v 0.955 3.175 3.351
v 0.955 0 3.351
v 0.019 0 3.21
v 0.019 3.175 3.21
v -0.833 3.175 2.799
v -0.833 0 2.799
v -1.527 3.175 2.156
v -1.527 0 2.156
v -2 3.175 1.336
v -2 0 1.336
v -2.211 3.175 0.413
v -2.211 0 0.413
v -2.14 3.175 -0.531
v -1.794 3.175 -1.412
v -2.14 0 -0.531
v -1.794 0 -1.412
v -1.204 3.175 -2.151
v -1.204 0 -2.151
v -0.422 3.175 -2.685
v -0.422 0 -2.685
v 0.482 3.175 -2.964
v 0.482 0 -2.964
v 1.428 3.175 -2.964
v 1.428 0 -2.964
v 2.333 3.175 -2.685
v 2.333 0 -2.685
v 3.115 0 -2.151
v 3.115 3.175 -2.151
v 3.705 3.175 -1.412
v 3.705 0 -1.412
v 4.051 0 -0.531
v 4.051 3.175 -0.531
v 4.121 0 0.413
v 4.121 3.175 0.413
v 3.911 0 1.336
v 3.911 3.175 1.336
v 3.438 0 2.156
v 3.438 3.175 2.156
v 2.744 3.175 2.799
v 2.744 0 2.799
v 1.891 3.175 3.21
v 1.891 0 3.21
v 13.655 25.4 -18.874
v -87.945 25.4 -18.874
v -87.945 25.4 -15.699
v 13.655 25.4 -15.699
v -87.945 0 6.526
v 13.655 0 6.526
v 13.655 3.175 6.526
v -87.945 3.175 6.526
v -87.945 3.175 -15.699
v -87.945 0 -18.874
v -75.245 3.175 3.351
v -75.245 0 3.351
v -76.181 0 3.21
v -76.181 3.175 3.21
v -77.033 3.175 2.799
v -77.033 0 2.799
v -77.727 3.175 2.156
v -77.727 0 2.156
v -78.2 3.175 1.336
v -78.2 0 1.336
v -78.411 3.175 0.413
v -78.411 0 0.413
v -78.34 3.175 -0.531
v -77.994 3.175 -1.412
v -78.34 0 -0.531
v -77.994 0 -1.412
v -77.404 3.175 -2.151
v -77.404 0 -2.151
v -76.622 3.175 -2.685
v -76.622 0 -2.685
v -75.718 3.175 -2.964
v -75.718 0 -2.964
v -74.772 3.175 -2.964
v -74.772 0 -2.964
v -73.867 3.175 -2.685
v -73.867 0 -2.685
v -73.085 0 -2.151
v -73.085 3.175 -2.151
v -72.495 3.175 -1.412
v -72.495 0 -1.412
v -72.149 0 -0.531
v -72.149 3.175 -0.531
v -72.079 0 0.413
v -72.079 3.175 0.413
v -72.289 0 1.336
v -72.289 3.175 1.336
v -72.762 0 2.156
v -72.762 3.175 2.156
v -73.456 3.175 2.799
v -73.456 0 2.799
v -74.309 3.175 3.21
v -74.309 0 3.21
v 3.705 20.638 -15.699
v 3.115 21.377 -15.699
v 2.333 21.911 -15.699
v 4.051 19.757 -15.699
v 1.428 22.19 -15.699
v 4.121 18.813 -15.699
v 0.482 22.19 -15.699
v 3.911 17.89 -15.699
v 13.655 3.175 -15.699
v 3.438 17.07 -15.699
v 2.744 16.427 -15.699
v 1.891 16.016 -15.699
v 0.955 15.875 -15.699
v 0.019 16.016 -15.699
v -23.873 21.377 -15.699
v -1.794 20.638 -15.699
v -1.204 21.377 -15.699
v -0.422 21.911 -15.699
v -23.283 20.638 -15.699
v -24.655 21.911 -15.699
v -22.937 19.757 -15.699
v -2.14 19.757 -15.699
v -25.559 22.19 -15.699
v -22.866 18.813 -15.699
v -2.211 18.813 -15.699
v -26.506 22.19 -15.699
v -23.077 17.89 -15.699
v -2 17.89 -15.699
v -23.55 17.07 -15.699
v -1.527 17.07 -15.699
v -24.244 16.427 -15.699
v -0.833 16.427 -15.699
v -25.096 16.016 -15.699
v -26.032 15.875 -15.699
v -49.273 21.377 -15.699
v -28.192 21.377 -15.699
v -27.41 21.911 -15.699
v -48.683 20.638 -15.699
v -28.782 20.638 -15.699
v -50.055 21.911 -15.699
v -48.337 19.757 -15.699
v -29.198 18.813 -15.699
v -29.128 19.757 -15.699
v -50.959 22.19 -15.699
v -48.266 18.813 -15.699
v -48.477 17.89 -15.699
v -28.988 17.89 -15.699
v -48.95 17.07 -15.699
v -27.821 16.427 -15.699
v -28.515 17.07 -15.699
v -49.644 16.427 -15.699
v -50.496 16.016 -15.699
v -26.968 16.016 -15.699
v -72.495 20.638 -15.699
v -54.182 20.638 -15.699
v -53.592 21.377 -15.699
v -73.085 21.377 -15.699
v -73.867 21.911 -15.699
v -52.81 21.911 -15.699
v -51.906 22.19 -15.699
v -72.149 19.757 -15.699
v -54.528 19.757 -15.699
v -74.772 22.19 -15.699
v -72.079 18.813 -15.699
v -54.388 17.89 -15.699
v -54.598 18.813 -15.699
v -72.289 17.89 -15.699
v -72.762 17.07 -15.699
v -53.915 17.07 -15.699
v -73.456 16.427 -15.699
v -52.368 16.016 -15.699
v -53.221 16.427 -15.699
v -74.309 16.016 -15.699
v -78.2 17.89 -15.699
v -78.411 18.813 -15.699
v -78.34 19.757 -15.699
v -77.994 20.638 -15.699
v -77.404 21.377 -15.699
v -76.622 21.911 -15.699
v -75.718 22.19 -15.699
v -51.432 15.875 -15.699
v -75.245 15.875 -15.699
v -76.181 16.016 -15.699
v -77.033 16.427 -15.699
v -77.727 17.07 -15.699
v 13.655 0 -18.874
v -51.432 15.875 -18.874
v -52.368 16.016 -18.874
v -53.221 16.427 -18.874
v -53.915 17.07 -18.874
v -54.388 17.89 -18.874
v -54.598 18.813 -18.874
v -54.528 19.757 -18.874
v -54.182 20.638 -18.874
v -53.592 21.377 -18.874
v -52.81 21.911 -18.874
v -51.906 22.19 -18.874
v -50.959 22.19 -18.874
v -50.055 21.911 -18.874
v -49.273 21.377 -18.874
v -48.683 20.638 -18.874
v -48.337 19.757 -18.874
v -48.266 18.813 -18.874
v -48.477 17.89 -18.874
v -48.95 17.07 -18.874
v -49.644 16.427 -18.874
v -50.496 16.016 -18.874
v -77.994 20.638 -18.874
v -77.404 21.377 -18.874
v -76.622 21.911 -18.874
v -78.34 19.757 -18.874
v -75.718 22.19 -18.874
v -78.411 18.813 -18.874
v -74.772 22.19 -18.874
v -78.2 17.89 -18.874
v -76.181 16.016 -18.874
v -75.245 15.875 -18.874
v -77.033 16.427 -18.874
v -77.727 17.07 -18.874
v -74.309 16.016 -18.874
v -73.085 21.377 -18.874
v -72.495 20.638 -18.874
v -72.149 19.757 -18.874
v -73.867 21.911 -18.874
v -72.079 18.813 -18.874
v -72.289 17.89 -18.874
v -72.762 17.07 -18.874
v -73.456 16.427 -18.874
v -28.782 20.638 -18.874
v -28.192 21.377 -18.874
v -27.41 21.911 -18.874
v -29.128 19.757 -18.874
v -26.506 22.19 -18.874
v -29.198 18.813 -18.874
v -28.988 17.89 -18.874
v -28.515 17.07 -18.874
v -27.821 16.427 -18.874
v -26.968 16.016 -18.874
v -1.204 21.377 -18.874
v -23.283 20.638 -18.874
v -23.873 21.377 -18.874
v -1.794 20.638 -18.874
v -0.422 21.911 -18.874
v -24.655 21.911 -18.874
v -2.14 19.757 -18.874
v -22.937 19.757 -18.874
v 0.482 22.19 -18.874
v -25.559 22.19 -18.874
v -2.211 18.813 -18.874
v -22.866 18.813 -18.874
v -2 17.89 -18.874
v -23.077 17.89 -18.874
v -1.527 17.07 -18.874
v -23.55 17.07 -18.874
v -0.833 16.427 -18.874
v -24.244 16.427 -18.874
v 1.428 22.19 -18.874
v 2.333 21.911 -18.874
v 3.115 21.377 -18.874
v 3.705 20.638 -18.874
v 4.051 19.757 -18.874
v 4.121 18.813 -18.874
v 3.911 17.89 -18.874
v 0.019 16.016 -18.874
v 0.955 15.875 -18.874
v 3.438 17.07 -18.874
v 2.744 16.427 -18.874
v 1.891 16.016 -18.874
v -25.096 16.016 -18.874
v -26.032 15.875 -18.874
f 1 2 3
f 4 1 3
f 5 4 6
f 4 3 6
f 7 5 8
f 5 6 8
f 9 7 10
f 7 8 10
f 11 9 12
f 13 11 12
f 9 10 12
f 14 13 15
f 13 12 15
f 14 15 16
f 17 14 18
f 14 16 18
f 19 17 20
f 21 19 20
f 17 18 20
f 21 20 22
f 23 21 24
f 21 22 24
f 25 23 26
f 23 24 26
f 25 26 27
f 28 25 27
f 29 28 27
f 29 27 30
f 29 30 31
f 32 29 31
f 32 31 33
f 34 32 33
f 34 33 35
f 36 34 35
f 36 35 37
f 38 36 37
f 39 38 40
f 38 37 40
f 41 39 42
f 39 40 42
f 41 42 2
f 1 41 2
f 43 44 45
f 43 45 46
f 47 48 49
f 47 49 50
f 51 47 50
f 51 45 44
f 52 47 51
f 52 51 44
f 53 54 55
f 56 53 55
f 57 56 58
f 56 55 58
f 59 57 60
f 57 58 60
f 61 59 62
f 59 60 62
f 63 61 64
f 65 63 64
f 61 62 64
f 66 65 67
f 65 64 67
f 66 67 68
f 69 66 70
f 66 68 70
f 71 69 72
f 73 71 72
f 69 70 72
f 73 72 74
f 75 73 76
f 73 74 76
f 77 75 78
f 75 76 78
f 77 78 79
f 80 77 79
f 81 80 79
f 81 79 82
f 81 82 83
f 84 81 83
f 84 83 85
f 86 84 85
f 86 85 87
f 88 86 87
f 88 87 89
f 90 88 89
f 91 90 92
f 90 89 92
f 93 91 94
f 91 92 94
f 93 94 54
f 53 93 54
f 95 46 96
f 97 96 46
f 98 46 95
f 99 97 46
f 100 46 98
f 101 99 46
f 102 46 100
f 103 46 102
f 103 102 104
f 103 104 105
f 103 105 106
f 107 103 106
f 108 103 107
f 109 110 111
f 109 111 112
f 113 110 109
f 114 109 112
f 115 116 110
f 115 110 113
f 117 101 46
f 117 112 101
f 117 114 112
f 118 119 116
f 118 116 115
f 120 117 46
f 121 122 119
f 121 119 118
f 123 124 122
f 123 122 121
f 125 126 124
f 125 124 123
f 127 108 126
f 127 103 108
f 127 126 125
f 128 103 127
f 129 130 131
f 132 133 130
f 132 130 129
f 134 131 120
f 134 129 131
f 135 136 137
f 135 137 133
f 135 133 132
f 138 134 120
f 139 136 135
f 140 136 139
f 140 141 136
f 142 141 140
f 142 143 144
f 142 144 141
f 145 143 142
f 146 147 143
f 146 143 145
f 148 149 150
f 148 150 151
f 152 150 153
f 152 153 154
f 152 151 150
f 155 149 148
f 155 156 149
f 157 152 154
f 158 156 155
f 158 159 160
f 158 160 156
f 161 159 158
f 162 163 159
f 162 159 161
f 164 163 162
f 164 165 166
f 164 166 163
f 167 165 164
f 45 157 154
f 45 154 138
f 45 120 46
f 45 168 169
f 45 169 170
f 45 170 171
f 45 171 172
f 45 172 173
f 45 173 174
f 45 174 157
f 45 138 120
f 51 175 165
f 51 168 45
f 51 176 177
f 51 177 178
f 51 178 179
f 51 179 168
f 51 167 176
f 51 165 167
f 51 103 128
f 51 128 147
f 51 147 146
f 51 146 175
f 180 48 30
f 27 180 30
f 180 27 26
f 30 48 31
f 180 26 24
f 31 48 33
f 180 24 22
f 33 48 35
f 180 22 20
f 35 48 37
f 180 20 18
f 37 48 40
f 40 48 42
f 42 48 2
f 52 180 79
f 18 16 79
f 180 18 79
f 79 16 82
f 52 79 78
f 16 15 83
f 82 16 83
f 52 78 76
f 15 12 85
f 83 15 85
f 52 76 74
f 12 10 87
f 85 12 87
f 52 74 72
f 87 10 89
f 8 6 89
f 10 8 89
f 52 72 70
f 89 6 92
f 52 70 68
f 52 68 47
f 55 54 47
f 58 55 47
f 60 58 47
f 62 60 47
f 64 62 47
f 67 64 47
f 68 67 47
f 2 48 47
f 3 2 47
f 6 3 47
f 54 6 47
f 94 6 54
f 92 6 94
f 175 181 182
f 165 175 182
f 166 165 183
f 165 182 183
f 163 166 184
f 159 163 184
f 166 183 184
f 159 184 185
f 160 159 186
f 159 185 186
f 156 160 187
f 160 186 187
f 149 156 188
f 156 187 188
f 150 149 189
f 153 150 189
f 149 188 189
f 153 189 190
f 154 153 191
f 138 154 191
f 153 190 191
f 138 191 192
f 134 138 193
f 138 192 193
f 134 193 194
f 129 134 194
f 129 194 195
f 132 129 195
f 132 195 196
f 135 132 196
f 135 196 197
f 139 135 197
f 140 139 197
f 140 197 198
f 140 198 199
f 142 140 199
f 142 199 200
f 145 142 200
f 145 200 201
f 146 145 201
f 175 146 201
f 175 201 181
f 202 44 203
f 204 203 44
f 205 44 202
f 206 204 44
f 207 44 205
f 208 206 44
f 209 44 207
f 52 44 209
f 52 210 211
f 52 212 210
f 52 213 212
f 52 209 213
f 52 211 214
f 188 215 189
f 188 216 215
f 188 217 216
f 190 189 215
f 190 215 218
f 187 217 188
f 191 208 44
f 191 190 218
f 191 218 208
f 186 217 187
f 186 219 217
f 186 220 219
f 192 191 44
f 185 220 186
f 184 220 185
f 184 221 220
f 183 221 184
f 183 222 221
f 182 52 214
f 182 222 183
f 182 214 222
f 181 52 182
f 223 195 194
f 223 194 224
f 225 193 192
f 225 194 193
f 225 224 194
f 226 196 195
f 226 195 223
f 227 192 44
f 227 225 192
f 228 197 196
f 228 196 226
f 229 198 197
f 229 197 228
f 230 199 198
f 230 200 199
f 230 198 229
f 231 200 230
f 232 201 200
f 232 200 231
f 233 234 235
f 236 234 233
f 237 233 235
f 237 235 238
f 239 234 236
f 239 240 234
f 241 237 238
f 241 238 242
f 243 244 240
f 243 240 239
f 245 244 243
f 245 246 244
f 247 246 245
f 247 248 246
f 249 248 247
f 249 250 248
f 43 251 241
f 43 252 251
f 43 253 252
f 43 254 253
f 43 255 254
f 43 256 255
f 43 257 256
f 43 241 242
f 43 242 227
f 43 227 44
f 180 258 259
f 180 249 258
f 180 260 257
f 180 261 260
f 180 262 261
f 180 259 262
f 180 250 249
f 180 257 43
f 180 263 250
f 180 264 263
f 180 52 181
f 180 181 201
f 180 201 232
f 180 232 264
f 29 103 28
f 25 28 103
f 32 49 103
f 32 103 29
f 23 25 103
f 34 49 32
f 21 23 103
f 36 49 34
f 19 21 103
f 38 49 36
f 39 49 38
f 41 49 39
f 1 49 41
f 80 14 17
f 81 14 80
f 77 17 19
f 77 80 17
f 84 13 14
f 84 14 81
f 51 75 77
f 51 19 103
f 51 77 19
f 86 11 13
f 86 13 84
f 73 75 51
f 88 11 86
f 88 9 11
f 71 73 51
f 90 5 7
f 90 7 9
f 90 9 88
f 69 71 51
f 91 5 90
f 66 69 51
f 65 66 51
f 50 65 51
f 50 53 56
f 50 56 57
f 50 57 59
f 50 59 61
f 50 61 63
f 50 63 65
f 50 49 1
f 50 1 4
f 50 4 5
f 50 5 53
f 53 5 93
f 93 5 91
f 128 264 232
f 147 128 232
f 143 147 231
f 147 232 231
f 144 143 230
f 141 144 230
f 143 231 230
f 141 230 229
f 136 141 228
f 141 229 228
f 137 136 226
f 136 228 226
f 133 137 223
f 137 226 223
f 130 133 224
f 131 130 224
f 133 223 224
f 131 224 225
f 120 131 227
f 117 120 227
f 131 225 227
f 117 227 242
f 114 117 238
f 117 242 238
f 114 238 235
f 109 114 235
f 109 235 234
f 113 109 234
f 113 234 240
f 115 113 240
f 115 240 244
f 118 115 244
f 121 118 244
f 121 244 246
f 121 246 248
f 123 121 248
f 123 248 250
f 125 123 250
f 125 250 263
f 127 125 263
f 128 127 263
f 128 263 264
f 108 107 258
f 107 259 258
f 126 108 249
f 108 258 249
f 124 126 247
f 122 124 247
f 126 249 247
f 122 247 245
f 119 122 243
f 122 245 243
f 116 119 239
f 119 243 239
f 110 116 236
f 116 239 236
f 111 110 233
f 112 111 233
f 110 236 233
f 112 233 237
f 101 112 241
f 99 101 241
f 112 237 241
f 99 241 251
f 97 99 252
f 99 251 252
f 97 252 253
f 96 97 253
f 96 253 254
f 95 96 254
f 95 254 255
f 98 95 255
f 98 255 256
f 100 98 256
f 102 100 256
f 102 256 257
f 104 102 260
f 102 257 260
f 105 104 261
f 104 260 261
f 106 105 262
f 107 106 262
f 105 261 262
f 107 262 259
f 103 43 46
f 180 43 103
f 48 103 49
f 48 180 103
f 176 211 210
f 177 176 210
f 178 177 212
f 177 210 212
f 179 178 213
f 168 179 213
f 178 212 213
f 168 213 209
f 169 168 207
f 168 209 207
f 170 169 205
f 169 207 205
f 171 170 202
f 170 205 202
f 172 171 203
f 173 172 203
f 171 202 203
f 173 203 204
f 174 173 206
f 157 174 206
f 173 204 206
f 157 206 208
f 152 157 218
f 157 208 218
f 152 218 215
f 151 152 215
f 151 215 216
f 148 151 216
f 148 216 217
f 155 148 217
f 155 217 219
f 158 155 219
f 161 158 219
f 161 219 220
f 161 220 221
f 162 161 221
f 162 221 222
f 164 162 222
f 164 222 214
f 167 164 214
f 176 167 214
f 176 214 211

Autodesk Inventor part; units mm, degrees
ref_plane "YZ Plane" through (0, 0, 0) normal (1, 0, 0) x (0, 1, 0)
ref_plane "XZ Plane" through (0, 0, 0) normal (0, 1, 0) x (-1, 0, 0)
ref_plane "XY Plane" through (0, 0, 0) normal (0, 0, 1) x (1, 0, 0)
sketch "Sketch1" plane through (0, 0, 0) normal (0, 1, 0) x (-1, 0, 0)
  line L0 (-13.6552, 6.526) -> (87.9448, 6.526)
  line L1 (87.9448, 6.526) -> (87.9448, -18.874)
  line L2 (87.9448, -18.874) -> (-13.6552, -18.874)
  line L3 (-13.6552, -18.874) -> (-13.6552, 6.526)
  dimension "d0" = 101.6
  dimension "d1" = 25.4
extrude "Extrusion1" add sketch "Sketch1" along normal blind 3.175
sketch "Sketch2" plane through (0, 3.175, 0) normal (0, 1, 0) x (1, 0, 0)
  line L0 (-87.9448, 18.874) -> (13.6552, 18.874)
  line L1 (13.6552, 18.874) -> (13.6552, 15.699)
  line L2 (13.6552, 15.699) -> (-87.9448, 15.699)
  line L3 (-87.9448, 15.699) -> (-87.9448, 18.874)
  dimension "d4" = 101.6
  dimension "d5" = 3.175
extrude "Extrusion2" add sketch "Sketch2" along normal blind 22.225
sketch "Sketch3" plane through (0, 3.175, 0) normal (0, 1, 0) x (1, 0, 0)
  line L0 (-87.9448, 15.699) -> (-87.9448, -6.526) projected
  line L1 (-87.9448, -6.526) -> (13.6552, -6.526) projected
  line L2 (13.6552, -6.526) -> (13.6552, 15.699) projected
  point P0 (-75.2448, -0.176)
  point P1 (0.9552, -0.176)
  dimension "d8" = 12.7
  dimension "d9" = 12.7
  dimension "d10" = 6.35
hole "Hole1" at (-75.2448, 3.175, 0.176) at (0.9552, 3.175, 0.176) direction (0, -1, 0) diameter 6.35 end through all
sketch "Sketch4" plane through (-87.9448, 3.175, -15.699) normal (0, 0, 1) x (1, 0, 0)
  line L0 (0, 22.225) -> (101.6, 22.225) projected
  line L1 (101.6, 0) -> (101.6, 22.225) projected
  line L2 (0, 0) -> (0, 22.225) projected
  point P0 (12.7, 15.875)
  point P1 (88.9, 15.875)
  point P2 (61.9125, 15.875)
  point P3 (36.5125, 15.875)
  dimension "d18" = 6.35
  dimension "d26" = 39.6875
  dimension "d27" = 36.5125
hole "Hole2" at (-75.2448, 19.05, -15.699) at (0.9552, 19.05, -15.699) at (-51.4323, 19.05, -15.699) at (-26.0323, 19.05, -15.699) direction (0, 0, -1) diameter 6.35 end through all
properties part number "Connection to frame"
